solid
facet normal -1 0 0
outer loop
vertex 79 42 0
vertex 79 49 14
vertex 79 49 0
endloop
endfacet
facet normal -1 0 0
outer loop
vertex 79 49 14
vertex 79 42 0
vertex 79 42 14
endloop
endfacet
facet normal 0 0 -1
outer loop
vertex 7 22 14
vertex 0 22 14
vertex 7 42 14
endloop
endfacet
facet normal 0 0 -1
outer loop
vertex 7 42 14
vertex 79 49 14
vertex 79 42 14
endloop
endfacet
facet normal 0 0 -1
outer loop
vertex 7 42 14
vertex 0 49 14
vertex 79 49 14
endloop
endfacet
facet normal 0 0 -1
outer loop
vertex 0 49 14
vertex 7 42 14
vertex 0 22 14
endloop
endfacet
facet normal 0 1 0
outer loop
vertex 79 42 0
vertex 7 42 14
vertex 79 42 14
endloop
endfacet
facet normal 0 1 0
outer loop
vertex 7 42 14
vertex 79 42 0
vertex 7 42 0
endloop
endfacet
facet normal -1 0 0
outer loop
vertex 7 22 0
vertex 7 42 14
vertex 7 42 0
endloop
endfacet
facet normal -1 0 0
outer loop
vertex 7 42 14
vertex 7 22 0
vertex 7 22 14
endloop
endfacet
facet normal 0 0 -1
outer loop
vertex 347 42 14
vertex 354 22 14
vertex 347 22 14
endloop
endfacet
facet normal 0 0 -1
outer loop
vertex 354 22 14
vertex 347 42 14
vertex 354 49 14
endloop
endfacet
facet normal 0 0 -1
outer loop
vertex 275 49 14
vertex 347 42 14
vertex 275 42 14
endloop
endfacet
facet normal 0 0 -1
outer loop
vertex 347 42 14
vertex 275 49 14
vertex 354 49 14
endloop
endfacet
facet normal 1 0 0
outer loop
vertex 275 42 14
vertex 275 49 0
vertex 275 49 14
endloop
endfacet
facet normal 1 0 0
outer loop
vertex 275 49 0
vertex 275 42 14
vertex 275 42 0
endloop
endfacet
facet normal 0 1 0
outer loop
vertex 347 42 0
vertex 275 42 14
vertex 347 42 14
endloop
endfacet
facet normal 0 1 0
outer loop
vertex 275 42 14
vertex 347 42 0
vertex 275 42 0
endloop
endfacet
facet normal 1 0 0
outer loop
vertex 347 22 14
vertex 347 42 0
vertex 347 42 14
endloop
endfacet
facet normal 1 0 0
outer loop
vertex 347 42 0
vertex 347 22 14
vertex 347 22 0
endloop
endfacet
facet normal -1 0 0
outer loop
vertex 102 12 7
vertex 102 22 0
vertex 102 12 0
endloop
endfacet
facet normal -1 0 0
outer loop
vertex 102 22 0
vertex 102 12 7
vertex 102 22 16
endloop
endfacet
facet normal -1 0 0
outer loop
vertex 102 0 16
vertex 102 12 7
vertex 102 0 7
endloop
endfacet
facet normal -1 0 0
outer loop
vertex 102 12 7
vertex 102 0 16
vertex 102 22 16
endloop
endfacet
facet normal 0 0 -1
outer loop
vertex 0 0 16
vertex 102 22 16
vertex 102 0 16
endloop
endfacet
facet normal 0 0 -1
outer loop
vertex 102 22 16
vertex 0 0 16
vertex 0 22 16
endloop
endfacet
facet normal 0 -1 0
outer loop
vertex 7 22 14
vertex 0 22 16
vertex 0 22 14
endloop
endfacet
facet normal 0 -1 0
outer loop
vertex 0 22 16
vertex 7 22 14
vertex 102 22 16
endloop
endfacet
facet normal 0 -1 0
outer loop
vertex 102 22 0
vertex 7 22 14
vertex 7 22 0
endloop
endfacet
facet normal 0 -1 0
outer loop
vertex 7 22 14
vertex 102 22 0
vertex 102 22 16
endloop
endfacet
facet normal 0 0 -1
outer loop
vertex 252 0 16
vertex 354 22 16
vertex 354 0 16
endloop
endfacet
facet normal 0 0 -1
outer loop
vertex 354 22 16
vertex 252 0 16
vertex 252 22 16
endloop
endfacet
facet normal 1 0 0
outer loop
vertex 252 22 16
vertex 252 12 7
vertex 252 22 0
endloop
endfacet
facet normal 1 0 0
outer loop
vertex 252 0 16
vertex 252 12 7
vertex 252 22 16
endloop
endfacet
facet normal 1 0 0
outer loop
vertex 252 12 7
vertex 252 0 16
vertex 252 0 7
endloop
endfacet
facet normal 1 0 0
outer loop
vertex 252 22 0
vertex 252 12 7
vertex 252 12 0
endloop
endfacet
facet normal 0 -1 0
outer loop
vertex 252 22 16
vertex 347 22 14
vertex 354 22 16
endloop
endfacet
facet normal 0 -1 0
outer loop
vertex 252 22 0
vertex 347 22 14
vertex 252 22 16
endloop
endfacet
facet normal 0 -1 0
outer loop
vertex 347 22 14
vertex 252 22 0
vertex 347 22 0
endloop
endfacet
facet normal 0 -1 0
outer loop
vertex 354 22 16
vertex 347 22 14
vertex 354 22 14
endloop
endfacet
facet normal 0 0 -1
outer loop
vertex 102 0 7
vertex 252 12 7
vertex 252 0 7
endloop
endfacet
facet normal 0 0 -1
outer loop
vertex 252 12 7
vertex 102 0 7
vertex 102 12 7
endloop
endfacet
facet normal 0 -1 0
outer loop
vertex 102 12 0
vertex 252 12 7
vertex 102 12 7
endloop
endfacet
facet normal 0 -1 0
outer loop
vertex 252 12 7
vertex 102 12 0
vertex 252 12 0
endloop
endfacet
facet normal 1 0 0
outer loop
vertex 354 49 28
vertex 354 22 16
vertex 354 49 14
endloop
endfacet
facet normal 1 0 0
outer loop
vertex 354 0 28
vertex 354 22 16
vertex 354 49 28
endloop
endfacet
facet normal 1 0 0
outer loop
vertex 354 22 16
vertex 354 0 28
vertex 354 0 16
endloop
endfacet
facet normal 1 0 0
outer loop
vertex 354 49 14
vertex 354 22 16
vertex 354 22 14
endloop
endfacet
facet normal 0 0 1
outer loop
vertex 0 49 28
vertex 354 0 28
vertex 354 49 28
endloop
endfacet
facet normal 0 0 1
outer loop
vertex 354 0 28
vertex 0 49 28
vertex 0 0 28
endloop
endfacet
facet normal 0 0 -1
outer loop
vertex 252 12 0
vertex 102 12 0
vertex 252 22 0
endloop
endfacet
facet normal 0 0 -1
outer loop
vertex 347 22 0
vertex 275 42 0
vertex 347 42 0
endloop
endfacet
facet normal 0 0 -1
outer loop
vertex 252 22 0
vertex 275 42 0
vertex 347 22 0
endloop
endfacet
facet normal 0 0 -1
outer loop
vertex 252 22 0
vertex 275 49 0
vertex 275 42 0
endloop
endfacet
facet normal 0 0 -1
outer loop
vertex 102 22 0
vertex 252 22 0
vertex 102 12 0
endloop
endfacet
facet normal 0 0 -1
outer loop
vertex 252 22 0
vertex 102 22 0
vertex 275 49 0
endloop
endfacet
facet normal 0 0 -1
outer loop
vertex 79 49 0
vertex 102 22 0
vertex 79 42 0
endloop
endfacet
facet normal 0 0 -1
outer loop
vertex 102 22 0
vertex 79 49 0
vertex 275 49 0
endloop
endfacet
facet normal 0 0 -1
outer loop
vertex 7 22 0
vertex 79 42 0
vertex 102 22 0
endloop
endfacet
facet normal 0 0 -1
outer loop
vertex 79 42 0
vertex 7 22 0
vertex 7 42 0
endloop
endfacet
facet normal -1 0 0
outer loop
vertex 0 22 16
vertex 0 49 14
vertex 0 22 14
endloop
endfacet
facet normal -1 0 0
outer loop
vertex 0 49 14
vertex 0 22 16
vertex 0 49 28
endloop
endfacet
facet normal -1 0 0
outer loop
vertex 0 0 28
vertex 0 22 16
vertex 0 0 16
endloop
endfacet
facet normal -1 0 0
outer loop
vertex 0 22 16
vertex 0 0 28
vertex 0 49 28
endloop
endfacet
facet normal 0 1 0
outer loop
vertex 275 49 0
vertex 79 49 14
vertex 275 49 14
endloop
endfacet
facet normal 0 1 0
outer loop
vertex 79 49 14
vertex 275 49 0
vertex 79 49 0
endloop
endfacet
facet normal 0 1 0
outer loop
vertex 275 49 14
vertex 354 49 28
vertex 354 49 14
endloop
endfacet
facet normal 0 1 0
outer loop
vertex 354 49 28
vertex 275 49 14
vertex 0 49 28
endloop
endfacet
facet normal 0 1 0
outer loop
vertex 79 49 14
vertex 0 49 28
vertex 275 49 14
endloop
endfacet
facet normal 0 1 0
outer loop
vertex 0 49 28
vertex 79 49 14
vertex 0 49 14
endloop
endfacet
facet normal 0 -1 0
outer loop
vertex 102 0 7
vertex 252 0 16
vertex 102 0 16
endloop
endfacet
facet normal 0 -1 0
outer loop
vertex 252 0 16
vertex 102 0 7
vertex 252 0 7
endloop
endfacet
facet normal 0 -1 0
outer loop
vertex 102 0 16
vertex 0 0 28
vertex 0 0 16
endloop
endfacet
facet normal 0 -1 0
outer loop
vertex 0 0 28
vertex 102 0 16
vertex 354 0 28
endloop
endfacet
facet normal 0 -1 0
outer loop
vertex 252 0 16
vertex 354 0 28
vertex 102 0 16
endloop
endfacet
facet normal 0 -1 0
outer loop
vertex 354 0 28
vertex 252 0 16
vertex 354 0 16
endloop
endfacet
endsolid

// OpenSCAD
include <../src/wardrobe.scad>;
plank_xy_bottom(wardrobe_n);
//github_openscad -o wardrobe_1/plank_xy_bottom.stl -D wardrobe_n=1 -D cutting_edge=0 -D break_view_length=0 wardrobe_1/plank_xy_bottom_stl.scad
